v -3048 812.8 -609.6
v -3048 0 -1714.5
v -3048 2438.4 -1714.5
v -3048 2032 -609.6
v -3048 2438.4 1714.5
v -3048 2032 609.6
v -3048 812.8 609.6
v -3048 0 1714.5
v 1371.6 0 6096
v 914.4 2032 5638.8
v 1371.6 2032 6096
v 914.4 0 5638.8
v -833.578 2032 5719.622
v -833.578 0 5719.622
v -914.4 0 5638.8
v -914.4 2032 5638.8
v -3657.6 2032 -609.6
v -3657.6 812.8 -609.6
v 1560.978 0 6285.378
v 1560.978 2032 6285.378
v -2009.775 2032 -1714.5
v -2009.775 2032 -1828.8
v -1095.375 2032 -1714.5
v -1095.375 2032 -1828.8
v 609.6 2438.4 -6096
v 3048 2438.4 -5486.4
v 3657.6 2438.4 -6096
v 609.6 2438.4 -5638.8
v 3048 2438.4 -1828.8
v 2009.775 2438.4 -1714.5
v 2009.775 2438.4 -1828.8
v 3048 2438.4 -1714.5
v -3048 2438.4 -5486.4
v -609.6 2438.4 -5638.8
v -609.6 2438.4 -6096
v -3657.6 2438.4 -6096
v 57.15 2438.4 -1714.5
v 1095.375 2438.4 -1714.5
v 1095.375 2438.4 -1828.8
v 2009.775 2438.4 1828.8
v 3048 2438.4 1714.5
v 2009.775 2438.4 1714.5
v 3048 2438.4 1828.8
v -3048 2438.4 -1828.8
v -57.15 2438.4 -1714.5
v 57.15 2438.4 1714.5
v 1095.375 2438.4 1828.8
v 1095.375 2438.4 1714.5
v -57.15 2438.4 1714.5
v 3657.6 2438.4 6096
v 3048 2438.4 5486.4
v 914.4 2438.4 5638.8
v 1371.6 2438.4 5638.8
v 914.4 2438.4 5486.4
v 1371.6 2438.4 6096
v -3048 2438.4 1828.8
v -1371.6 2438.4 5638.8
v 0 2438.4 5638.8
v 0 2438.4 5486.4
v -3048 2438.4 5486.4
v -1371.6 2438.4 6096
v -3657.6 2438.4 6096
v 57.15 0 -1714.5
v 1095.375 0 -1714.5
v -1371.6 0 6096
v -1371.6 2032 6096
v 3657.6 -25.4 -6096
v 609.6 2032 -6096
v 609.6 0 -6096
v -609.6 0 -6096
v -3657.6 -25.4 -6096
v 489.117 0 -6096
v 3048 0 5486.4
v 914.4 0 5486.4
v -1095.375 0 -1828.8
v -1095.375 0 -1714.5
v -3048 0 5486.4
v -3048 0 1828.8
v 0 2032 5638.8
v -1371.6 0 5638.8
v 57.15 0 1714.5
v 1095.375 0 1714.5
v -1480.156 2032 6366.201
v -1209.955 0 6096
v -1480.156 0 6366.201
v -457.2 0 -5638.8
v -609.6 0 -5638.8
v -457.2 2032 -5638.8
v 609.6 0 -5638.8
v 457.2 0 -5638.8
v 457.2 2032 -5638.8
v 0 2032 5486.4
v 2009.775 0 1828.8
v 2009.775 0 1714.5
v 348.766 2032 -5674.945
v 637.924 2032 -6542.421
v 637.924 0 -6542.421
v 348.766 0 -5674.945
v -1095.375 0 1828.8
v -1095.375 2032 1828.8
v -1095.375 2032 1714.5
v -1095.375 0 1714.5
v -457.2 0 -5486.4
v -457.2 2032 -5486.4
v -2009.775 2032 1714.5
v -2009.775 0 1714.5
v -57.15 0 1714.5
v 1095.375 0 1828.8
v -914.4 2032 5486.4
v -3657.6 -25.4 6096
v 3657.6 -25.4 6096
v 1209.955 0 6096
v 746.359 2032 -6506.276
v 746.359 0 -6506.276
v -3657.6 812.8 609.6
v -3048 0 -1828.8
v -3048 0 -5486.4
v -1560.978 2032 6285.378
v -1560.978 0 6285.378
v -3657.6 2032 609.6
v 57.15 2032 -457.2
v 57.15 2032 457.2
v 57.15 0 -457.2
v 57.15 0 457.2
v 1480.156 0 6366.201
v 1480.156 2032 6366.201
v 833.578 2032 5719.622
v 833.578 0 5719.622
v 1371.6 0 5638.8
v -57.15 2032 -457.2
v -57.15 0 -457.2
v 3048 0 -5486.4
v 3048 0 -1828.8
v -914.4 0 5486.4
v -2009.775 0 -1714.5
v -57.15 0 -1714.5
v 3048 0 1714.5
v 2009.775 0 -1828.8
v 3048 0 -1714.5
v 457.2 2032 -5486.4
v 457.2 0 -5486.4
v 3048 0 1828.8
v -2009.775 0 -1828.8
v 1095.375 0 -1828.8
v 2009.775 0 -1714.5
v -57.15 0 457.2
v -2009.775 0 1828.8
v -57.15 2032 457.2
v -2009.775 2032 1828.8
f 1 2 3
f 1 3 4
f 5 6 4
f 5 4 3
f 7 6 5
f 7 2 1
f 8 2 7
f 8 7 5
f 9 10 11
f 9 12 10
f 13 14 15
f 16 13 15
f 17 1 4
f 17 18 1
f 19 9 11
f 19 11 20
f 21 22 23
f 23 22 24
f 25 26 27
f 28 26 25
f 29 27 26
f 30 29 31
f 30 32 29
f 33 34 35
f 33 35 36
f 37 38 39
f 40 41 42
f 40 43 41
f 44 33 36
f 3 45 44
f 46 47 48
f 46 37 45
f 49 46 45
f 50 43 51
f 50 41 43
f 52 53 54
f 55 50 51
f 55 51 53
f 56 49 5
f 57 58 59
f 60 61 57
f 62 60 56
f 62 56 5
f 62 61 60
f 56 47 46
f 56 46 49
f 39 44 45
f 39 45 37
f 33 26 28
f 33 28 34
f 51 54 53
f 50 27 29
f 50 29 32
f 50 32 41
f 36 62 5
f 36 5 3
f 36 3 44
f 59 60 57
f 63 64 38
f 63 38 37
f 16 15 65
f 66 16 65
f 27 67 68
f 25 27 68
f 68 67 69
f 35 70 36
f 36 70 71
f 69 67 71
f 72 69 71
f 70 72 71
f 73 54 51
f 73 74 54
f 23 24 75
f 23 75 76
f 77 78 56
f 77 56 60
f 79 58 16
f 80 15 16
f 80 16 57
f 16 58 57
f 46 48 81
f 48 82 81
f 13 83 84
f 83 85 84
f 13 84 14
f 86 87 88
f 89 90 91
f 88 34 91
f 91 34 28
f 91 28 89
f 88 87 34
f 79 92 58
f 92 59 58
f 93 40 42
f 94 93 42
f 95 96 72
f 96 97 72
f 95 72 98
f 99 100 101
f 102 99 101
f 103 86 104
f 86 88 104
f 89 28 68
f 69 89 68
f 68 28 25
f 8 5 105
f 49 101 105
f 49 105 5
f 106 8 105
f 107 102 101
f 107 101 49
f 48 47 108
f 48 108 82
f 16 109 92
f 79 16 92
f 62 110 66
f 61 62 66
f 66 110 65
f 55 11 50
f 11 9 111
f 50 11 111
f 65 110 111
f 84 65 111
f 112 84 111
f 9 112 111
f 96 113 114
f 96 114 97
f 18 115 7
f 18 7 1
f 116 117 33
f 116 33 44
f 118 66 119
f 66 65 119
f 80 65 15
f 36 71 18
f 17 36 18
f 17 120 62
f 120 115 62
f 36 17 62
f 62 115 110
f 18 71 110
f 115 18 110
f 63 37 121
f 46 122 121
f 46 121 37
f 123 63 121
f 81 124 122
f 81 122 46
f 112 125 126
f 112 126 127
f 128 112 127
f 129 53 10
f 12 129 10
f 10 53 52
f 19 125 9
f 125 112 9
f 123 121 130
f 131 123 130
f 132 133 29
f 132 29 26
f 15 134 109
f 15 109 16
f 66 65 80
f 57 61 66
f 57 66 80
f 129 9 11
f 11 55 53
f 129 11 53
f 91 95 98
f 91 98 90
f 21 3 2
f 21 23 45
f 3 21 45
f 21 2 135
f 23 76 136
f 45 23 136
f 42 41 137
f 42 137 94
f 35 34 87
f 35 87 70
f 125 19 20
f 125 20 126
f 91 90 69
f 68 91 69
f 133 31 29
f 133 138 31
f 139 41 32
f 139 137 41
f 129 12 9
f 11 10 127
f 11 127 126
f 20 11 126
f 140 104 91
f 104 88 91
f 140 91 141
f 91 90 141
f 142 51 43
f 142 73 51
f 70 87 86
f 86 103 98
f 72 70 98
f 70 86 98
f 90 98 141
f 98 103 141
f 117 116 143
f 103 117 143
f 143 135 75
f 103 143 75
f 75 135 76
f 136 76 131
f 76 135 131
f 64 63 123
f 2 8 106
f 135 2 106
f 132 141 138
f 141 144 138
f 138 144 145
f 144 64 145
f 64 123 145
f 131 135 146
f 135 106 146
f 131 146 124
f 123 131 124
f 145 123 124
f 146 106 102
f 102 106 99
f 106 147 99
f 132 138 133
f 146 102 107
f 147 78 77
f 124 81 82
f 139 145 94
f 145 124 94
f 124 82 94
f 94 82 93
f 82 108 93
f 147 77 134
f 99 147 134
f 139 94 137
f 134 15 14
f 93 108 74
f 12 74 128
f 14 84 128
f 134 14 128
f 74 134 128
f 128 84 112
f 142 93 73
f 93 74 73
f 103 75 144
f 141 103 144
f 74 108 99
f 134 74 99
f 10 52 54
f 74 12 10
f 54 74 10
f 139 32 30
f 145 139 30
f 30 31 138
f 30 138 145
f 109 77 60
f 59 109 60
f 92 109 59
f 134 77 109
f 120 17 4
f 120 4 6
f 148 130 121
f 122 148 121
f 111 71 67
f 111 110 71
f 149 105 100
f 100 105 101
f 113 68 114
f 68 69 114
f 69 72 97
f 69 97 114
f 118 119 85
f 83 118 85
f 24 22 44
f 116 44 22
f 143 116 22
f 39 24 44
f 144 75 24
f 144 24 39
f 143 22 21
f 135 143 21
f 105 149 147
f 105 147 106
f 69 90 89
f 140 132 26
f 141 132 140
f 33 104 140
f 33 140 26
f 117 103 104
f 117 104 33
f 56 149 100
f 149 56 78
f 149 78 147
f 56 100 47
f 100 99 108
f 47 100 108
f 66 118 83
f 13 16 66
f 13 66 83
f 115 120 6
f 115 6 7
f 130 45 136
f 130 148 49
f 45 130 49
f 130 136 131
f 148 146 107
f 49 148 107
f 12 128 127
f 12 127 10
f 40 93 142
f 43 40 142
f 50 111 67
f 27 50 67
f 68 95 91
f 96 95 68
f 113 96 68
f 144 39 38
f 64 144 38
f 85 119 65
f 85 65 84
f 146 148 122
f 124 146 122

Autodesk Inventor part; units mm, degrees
ref_plane "YZ Plane" through (0, 0, 0) normal (1, 0, 0) x (0, 1, 0)
ref_plane "XZ Plane" through (0, 0, 0) normal (0, 1, 0) x (-1, 0, 0)
ref_plane "XY Plane" through (0, 0, 0) normal (0, 0, 1) x (1, 0, 0)
sketch "Sketch1" plane through (0, 0, 0) normal (0, 1, 0) x (-1, 0, 0)
  line L0 (3657.6, -6096) -> (3657.6, 6096)
  line L1 (-3657.6, 6096) -> (-3657.6, -6096)
  line L2 (-5120.64, 0) -> (5120.64, 0) projected
  line L3 (0, -23842.3169) -> (0, 22994.4703) projected
  line L4 (-3048, 1714.5) -> (-3048, -1714.5)
  line L5 (3048, -5486.4) -> (3048, -1828.8)
  line L6 (3048, -1714.5) -> (3048, 1714.5)
  line L7 (3048, 1828.8) -> (3048, 5486.4)
  line L8 (-3048, -1828.8) -> (-3048, -5486.4)
  line L9 (-3048, 5486.4) -> (-3048, 1828.8)
  line L10 (-3048, 1714.5) -> (-3048, -1714.5)
  line L11 (-2009.775, -1828.8) -> (-2009.775, -1714.5)
  line L12 (-1095.375, -1828.8) -> (-1095.375, -1714.5)
  line L13 (-3048, -1714.5) -> (-2009.775, -1714.5)
  line L14 (-1095.375, -1714.5) -> (-57.15, -1714.5)
  line L15 (-3048, -1828.8) -> (-2009.775, -1828.8)
  line L16 (2009.775, -1828.8) -> (2009.775, -1714.5)
  line L17 (1095.375, -1828.8) -> (1095.375, -1714.5)
  line L18 (3048, -1714.5) -> (2009.775, -1714.5)
  line L19 (1095.375, -1714.5) -> (57.15, -1714.5)
  line L20 (3048, -1828.8) -> (2009.775, -1828.8)
  line L21 (1095.375, -1828.8) -> (-1095.375, -1828.8)
  line L22 (-2009.775, -1828.8) -> (-3048, -1828.8)
  line L23 (-1095.375, -1828.8) -> (1095.375, -1828.8)
  line L24 (2009.775, -1828.8) -> (3048, -1828.8)
  line L25 (57.15, -1714.5) -> (1095.375, -1714.5)
  line L26 (2009.775, -1714.5) -> (3048, -1714.5)
  line L27 (-2009.775, 1828.8) -> (-2009.775, 1714.5)
  line L28 (-1095.375, 1828.8) -> (-1095.375, 1714.5)
  line L29 (-3048, 1714.5) -> (-2009.775, 1714.5)
  line L30 (-1095.375, 1714.5) -> (-57.15, 1714.5)
  line L31 (-3048, 1828.8) -> (-2009.775, 1828.8)
  line L32 (3048, 1714.5) -> (2009.775, 1714.5)
  line L33 (3048, 1828.8) -> (2009.775, 1828.8)
  line L34 (2009.775, 1828.8) -> (2009.775, 1714.5)
  line L35 (1095.375, 1828.8) -> (1095.375, 1714.5)
  line L36 (1095.375, 1714.5) -> (57.15, 1714.5)
  line L37 (1095.375, 1828.8) -> (-1095.375, 1828.8)
  line L38 (-2009.775, 1828.8) -> (-3048, 1828.8)
  line L39 (-1095.375, 1828.8) -> (1095.375, 1828.8)
  line L40 (2009.775, 1828.8) -> (3048, 1828.8)
  line L41 (57.15, 1714.5) -> (1095.375, 1714.5)
  line L42 (2009.775, 1714.5) -> (3048, 1714.5)
  line L43 (-57.15, -457.2) -> (57.15, -457.2)
  line L44 (57.15, 457.2) -> (-57.15, 457.2)
  line L45 (-457.2, -6096) -> (-457.2, -5486.4)
  line L46 (457.2, -6096) -> (457.2, -5486.4)
  line L47 (-3048, -5486.4) -> (-457.2, -5486.4)
  line L48 (457.2, -5486.4) -> (3048, -5486.4)
  line L49 (-3657.6, -6096) -> (-457.2, -6096)
  line L50 (457.2, -6096) -> (3657.6, -6096)
  line L51 (914.4, 5486.4) -> (914.4, 6096)
  line L52 (-914.4, 6096) -> (-914.4, 5486.4)
  line L53 (3048, 5486.4) -> (914.4, 5486.4)
  line L54 (-914.4, 5486.4) -> (-3048, 5486.4)
  line L55 (3657.6, 6096) -> (914.4, 6096)
  line L56 (-914.4, 6096) -> (-3657.6, 6096)
  line L57 (-57.15, -1714.5) -> (-57.15, -457.2)
  line L58 (-57.15, 457.2) -> (-57.15, 1714.5)
  line L59 (-57.15, 1714.5) -> (-57.15, 457.2)
  line L60 (-57.15, -457.2) -> (-57.15, -1714.5)
  line L61 (57.15, -1714.5) -> (57.15, -457.2)
  line L62 (57.15, 457.2) -> (57.15, 1714.5)
  line L63 (57.15, 1714.5) -> (57.15, 457.2)
  line L64 (57.15, -457.2) -> (57.15, -1714.5)
  line L65 (-3048, 5486.4) -> (-3048, 1828.8)
  line L66 (-3048, 1828.8) -> (-2009.775, 1828.8)
  line L67 (-2009.775, 1828.8) -> (-2009.775, 1714.5)
  line L68 (-2009.775, 1714.5) -> (-3048, 1714.5)
  line L69 (-3048, 1714.5) -> (-3048, -1714.5)
  line L70 (-3048, -1714.5) -> (-2009.775, -1714.5)
  line L71 (-2009.775, -1714.5) -> (-2009.775, -1828.8)
  line L72 (-2009.775, -1828.8) -> (-3048, -1828.8)
  line L73 (-3048, -1828.8) -> (-3048, -5486.4)
  line L74 (-3048, -5486.4) -> (-457.2, -5486.4)
  line L75 (457.2, -5486.4) -> (3048, -5486.4)
  line L76 (3048, -5486.4) -> (3048, -1828.8)
  line L77 (3048, -1828.8) -> (2009.775, -1828.8)
  line L78 (2009.775, -1828.8) -> (2009.775, -1714.5)
  line L79 (2009.775, -1714.5) -> (3048, -1714.5)
  line L80 (3048, 1714.5) -> (3048, -1714.5)
  line L81 (3048, 1714.5) -> (2009.775, 1714.5)
  line L82 (2009.775, 1714.5) -> (2009.775, 1828.8)
  line L83 (2009.775, 1828.8) -> (3048, 1828.8)
  line L84 (3048, 1828.8) -> (3048, 5486.4)
  point P0 (0, 0)
  point P1 (0, 23842.3169)
  point P2 (0, -22994.4703)
  dimension "d2" = 7315.2
  dimension "d10" = 609.6
  dimension "d13" = 1038.225
  dimension "d14" = 914.4
  dimension "d17" = 114.3
  dimension "d18" = 1038.225
  dimension "d19" = 1038.225
  dimension "d20" = 914.4
  dimension "d21" = 914.4
  dimension "d23" = 609.6
  dimension "d24" = 4267.2
  dimension "d25" = 1828.8
  dimension "d26" = 12192
  dimension "d27" = 609.6
  dimension "d28" = 114.3
extrude "Extrusion1" add sketch "Sketch1" along normal blind 2438.4
sketch "Sketch2" plane through (-3657.6, 0, -6096) normal (-1, 0, 0) x (0, 0, 1)
  line L0 (0, 0) -> (12192, 0) projected
  line L1 (5486.4, 2032) -> (6705.6, 2032)
  line L2 (6705.6, 2032) -> (6705.6, 812.8)
  line L3 (6705.6, 812.8) -> (5486.4, 812.8)
  line L4 (5486.4, 812.8) -> (5486.4, 2032)
  line L5 (6096, 2926.08) -> (6096, -487.68) projected
  point P0 (6096, 0)
  dimension "d31" = 1219.2
  dimension "d33" = 1219.2
  dimension "d34" = 812.8
extrude "Extrusion2" cut sketch "Sketch2" against normal up to surface (609.6 mm away)
sketch "Sketch3" plane through (0, 2438.4, 0) normal (0, 1, 0) x (1, 0, 0)
  line L0 (57.15, 1714.5) -> (1095.375, 1714.5) projected
  line L1 (1095.375, 1714.5) -> (1095.375, 1828.8) projected
  line L2 (1095.375, 1828.8) -> (-1095.375, 1828.8) projected
  line L3 (-1095.375, 1828.8) -> (-1095.375, 1714.5) projected
  line L4 (-1095.375, 1714.5) -> (-57.15, 1714.5) projected
  line L5 (-57.15, 1714.5) -> (-57.15, 457.2) projected
  line L6 (-57.15, 457.2) -> (57.15, 457.2) projected
  line L7 (57.15, 457.2) -> (57.15, 1714.5) projected
  line L8 (-57.15, -1714.5) -> (-1095.375, -1714.5) projected
  line L9 (-1095.375, -1714.5) -> (-1095.375, -1828.8) projected
  line L10 (-1095.375, -1828.8) -> (1095.375, -1828.8) projected
  line L11 (1095.375, -1828.8) -> (1095.375, -1714.5) projected
  line L12 (1095.375, -1714.5) -> (57.15, -1714.5) projected
  line L13 (57.15, -1714.5) -> (57.15, -457.2) projected
  line L14 (57.15, -457.2) -> (-57.15, -457.2) projected
  line L15 (-57.15, -457.2) -> (-57.15, -1714.5) projected
  line L16 (3657.6, 6096) -> (457.2, 6096) projected
  line L17 (457.2, 6096) -> (457.2, 5486.4) projected
  line L18 (457.2, 5486.4) -> (3048, 5486.4) projected
  line L19 (3048, 5486.4) -> (3048, 1828.8) projected
  line L20 (3048, 1828.8) -> (2009.775, 1828.8) projected
  line L21 (2009.775, 1828.8) -> (2009.775, 1714.5) projected
  line L22 (2009.775, 1714.5) -> (3048, 1714.5) projected
  line L23 (3048, 1714.5) -> (3048, -1714.5) projected
  line L24 (3048, -1714.5) -> (2009.775, -1714.5) projected
  line L25 (2009.775, -1714.5) -> (2009.775, -1828.8) projected
  line L26 (2009.775, -1828.8) -> (3048, -1828.8) projected
  line L27 (3048, -1828.8) -> (3048, -5486.4) projected
  line L28 (3048, -5486.4) -> (914.4, -5486.4) projected
  line L29 (914.4, -5486.4) -> (914.4, -6096) projected
  line L30 (914.4, -6096) -> (3657.6, -6096) projected
  line L31 (3657.6, -6096) -> (3657.6, 6096) projected
  line L32 (-457.2, 6096) -> (457.2, 6096)
  line L33 (457.2, 6096) -> (457.2, 5486.4)
  line L34 (457.2, 5486.4) -> (-457.2, 5486.4)
  line L35 (-457.2, 5486.4) -> (-457.2, 6096)
  line L36 (-2009.775, 1828.8) -> (-1095.375, 1828.8)
  line L37 (-1095.375, 1828.8) -> (-1095.375, 1714.5)
  line L38 (-1095.375, 1714.5) -> (-2009.775, 1714.5)
  line L39 (-2009.775, 1714.5) -> (-2009.775, 1828.8)
  line L40 (1095.375, 1828.8) -> (2009.775, 1828.8)
  line L41 (2009.775, 1828.8) -> (2009.775, 1714.5)
  line L42 (2009.775, 1714.5) -> (1095.375, 1714.5)
  line L43 (1095.375, 1714.5) -> (1095.375, 1828.8)
  line L44 (-57.15, 457.2) -> (57.15, 457.2)
  line L45 (57.15, 457.2) -> (57.15, -457.2)
  line L46 (57.15, -457.2) -> (-57.15, -457.2)
  line L47 (-57.15, -457.2) -> (-57.15, 457.2)
  line L48 (1095.375, -1714.5) -> (2009.775, -1714.5)
  line L49 (2009.775, -1714.5) -> (2009.775, -1828.8)
  line L50 (2009.775, -1828.8) -> (1095.375, -1828.8)
  line L51 (1095.375, -1828.8) -> (1095.375, -1714.5)
  line L52 (-2009.775, -1714.5) -> (-1095.375, -1714.5)
  line L53 (-1095.375, -1714.5) -> (-1095.375, -1828.8)
  line L54 (-1095.375, -1828.8) -> (-2009.775, -1828.8)
  line L55 (-2009.775, -1828.8) -> (-2009.775, -1714.5)
  line L56 (-914.4, -5486.4) -> (914.4, -5486.4)
  line L57 (914.4, -5486.4) -> (914.4, -6096)
  line L58 (914.4, -6096) -> (-914.4, -6096)
  line L59 (-914.4, -6096) -> (-914.4, -5486.4)
  line L60 (1095.375, 1828.8) -> (2009.775, 1828.8)
  line L61 (2009.775, 1828.8) -> (2009.775, 1714.5)
  line L62 (2009.775, 1714.5) -> (1095.375, 1714.5)
  line L63 (1095.375, 1714.5) -> (1095.375, 1828.8)
  point P0 (0, 0)
extrude "Extrusion3" add sketch "Sketch3" against normal blind 406.4 contours L1 L40 L21 L42 | L45 L14 L47 L6 | L3 L38 L39 L36 | L48 L25 L50 L11 | L9 L54 L55 L52 | L34 L35 L32 L17 | L29 L58 L59 L56
sketch "Sketch5" plane through (0, 0, 0) normal (0, -1, 0) x (1, 0, 0)
  line L0 (3657.6, -6096) -> (457.2, -6096) projected
  line L1 (3657.6, 6096) -> (3657.6, -6096) projected
  line L2 (914.4, 6096) -> (3657.6, 6096) projected
  line L3 (914.4, 5486.4) -> (914.4, 6096) projected
  line L4 (3048, 5486.4) -> (914.4, 5486.4) projected
  line L5 (3048, 1828.8) -> (3048, 5486.4) projected
  line L6 (2009.775, 1828.8) -> (3048, 1828.8) projected
  line L7 (2009.775, 1714.5) -> (2009.775, 1828.8) projected
  line L8 (3048, 1714.5) -> (2009.775, 1714.5) projected
  line L9 (3048, -1714.5) -> (3048, 1714.5) projected
  line L10 (2009.775, -1714.5) -> (3048, -1714.5) projected
  line L11 (2009.775, -1828.8) -> (2009.775, -1714.5) projected
  line L12 (3048, -1828.8) -> (2009.775, -1828.8) projected
  line L13 (3048, -5486.4) -> (3048, -1828.8) projected
  line L14 (457.2, -5486.4) -> (3048, -5486.4) projected
  line L15 (457.2, -6096) -> (457.2, -5486.4) projected
  line L16 (-3657.6, 6096) -> (3657.6, 6096)
  line L17 (3657.6, 6096) -> (3657.6, -6096)
  line L18 (3657.6, -6096) -> (-3657.6, -6096)
  line L19 (-3657.6, -6096) -> (-3657.6, 6096)
  point P0 (0, 0)
extrude "Extrusion5" add sketch "Sketch5" along normal blind 25.4
sketch "Sketch6" plane through (0, 2438.4, 0) normal (0, 1, 0) x (1, 0, 0)
  line L0 (-3048, 5486.4) -> (3048, 5486.4) projected
  line L1 (3048, -5486.4) -> (-3048, -5486.4) projected
  line L2 (457.2, 5486.4) -> (457.2, 6096) projected
  line L3 (-457.2, 6096) -> (-457.2, 5486.4) projected
  line L4 (-914.4, -6096) -> (-914.4, -5486.4) projected
  line L5 (914.4, -6096) -> (-914.4, -6096) projected
  line L6 (914.4, -5486.4) -> (914.4, -6096) projected
  line L7 (3048, -5486.4) -> (914.4, -5486.4) projected
  line L8 (3048, -1828.8) -> (3048, -5486.4) projected
  line L9 (2009.775, -1828.8) -> (3048, -1828.8) projected
  line L10 (2009.775, -1714.5) -> (2009.775, -1828.8) projected
  line L11 (3048, -1714.5) -> (2009.775, -1714.5) projected
  line L12 (3048, 1714.5) -> (3048, -1714.5) projected
  line L13 (2009.775, 1714.5) -> (3048, 1714.5) projected
  line L14 (2009.775, 1828.8) -> (2009.775, 1714.5) projected
  line L15 (3048, 1828.8) -> (2009.775, 1828.8) projected
  line L16 (3048, 5486.4) -> (3048, 1828.8) projected
  line L17 (457.2, 5486.4) -> (3048, 5486.4) projected
  line L18 (457.2, 6096) -> (457.2, 5486.4) projected
  line L19 (-457.2, 6096) -> (457.2, 6096) projected
  line L20 (-457.2, 5486.4) -> (-457.2, 6096) projected
  line L21 (-3048, 5486.4) -> (-457.2, 5486.4) projected
  line L22 (-3048, 1828.8) -> (-3048, 5486.4) projected
  line L23 (-2009.775, 1828.8) -> (-3048, 1828.8) projected
  line L24 (-2009.775, 1714.5) -> (-2009.775, 1828.8) projected
  line L25 (-3048, 1714.5) -> (-2009.775, 1714.5) projected
  line L26 (-3048, -1714.5) -> (-3048, 1714.5) projected
  line L27 (-2009.775, -1714.5) -> (-3048, -1714.5) projected
  line L28 (-2009.775, -1828.8) -> (-2009.775, -1714.5) projected
  line L29 (-3048, -1828.8) -> (-2009.775, -1828.8) projected
  line L30 (-3048, -5486.4) -> (-3048, -1828.8) projected
  line L31 (-914.4, -5486.4) -> (-3048, -5486.4) projected
  line L32 (1095.375, -1714.5) -> (57.15, -1714.5) projected
  line L33 (1095.375, -1828.8) -> (1095.375, -1714.5) projected
  line L34 (-1095.375, -1828.8) -> (1095.375, -1828.8) projected
  line L35 (-1095.375, -1714.5) -> (-1095.375, -1828.8) projected
  line L36 (-57.15, -1714.5) -> (-1095.375, -1714.5) projected
  line L37 (-57.15, -457.2) -> (-57.15, -1714.5) projected
  line L38 (57.15, -457.2) -> (-57.15, -457.2) projected
  line L39 (57.15, -1714.5) -> (57.15, -457.2) projected
  line L40 (-57.15, 457.2) -> (57.15, 457.2) projected
  line L41 (-57.15, 1714.5) -> (-57.15, 457.2) projected
  line L42 (-1095.375, 1714.5) -> (-57.15, 1714.5) projected
  line L43 (-1095.375, 1828.8) -> (-1095.375, 1714.5) projected
  line L44 (1095.375, 1828.8) -> (-1095.375, 1828.8) projected
  line L45 (1095.375, 1714.5) -> (1095.375, 1828.8) projected
  line L46 (57.15, 1714.5) -> (1095.375, 1714.5) projected
  line L47 (57.15, 457.2) -> (57.15, 1714.5) projected
  line L48 (-457.2, 6096) -> (457.2, 6096)
  line L49 (457.2, 6096) -> (457.2, 5638.8)
  line L50 (457.2, 5638.8) -> (-457.2, 5638.8)
  line L51 (-457.2, 5638.8) -> (-457.2, 6096)
  line L52 (-914.4, -6096) -> (914.4, -6096)
  line L53 (914.4, -6096) -> (914.4, -5638.8)
  line L54 (914.4, -5638.8) -> (-914.4, -5638.8)
  line L55 (-914.4, -5638.8) -> (-914.4, -6096)
  point P0 (0, 0)
  dimension "d46" = 152.4
  dimension "d47" = 152.4
extrude "Extrusion6" cut sketch "Sketch6" against normal up to next contours L3 L19 L2 L50 | L54 L6 L5 L4
sketch "Sketch7" plane through (0, 2438.4, 0) normal (0, 1, 0) x (1, 0, 0)
  line L0 (-914.4, -5638.8) -> (914.4, -5638.8) projected
  line L1 (3048, -5486.4) -> (-3048, -5486.4) projected
  line L2 (0, -5638.8) -> (914.4, -5638.8)
  line L3 (914.4, -5638.8) -> (914.4, -5486.4)
  line L4 (914.4, -5486.4) -> (0, -5486.4)
  line L5 (0, -5486.4) -> (0, -5638.8)
  point P0 (0, 0)
extrude "Extrusion7" cut sketch "Sketch7" against normal up to next
sketch "Sketch8" plane through (0, 2438.4, 0) normal (0, 1, 0) x (1, 0, 0)
  line L0 (3657.6, 6096) -> (457.2, 6096) projected
  line L1 (-457.2, 5638.8) -> (-457.2, 6096) projected
  line L2 (-457.2, 6096) -> (-3657.6, 6096) projected
  line L3 (-914.4, -6096) -> (-914.4, -5638.8) projected
  line L4 (-914.4, -5638.8) -> (0, -5638.8) projected
  line L5 (-914.4, -6096) -> (-1371.6, -6096)
  line L6 (-1371.6, -6096) -> (-1371.6, -5638.8)
  line L7 (-1371.6, -5638.8) -> (-914.4, -5638.8)
  line L8 (-914.4, -5638.8) -> (-914.4, -6096)
  line L9 (914.4, -6096) -> (1371.6, -6096)
  line L10 (1371.6, -6096) -> (1371.6, -5638.8)
  line L11 (1371.6, -5638.8) -> (914.4, -5638.8)
  line L12 (914.4, -5638.8) -> (914.4, -6096)
  line L13 (457.2, 5638.8) -> (609.6, 5638.8)
  line L14 (609.6, 5638.8) -> (609.6, 6096)
  line L15 (609.6, 6096) -> (457.2, 6096)
  line L16 (457.2, 6096) -> (457.2, 5638.8)
  line L17 (-457.2, 5638.8) -> (-609.6, 5638.8)
  line L18 (-609.6, 5638.8) -> (-609.6, 6096)
  line L19 (-609.6, 6096) -> (-457.2, 6096)
  line L20 (-457.2, 6096) -> (-457.2, 5638.8)
  point P0 (0, 0)
  dimension "d52" = 457.2
  dimension "d53" = 457.2
  dimension "d54" = 152.4
  dimension "d55" = 152.4
extrude "Extrusion8" cut sketch "Sketch8" against normal up to surface (2438.4 mm away)
sketch "Sketch9" plane through (0, 2438.4, 0) normal (0, 1, 0) x (1, 0, 0)
  line L0 (1095.375, -1714.5) -> (57.15, -1714.5) projected
  line L1 (1095.375, -1828.8) -> (1095.375, -1714.5) projected
  line L2 (-1095.375, -1828.8) -> (1095.375, -1828.8) projected
  line L3 (-1095.375, -1714.5) -> (-1095.375, -1828.8) projected
  line L4 (-57.15, -1714.5) -> (-1095.375, -1714.5) projected
  line L5 (-57.15, -457.2) -> (-57.15, -1714.5) projected
  line L6 (57.15, -457.2) -> (-57.15, -457.2) projected
  line L7 (57.15, -1714.5) -> (57.15, -457.2) projected
  line L8 (-57.15, 457.2) -> (57.15, 457.2) projected
  line L9 (-57.15, 1714.5) -> (-57.15, 457.2) projected
  line L10 (-1095.375, 1714.5) -> (-57.15, 1714.5) projected
  line L11 (-1095.375, 1828.8) -> (-1095.375, 1714.5) projected
  line L12 (1095.375, 1828.8) -> (-1095.375, 1828.8) projected
  line L13 (1095.375, 1714.5) -> (1095.375, 1828.8) projected
  line L14 (57.15, 1714.5) -> (1095.375, 1714.5) projected
  line L15 (57.15, 457.2) -> (57.15, 1714.5) projected
  line L16 (914.4, -5486.4) -> (914.4, -5638.8) projected
  line L17 (3048, -5486.4) -> (914.4, -5486.4) projected
  line L18 (3048, -1828.8) -> (3048, -5486.4) projected
  line L19 (2009.775, -1828.8) -> (3048, -1828.8) projected
  line L20 (2009.775, -1714.5) -> (2009.775, -1828.8) projected
  line L21 (3048, -1714.5) -> (2009.775, -1714.5) projected
  line L22 (3048, 1714.5) -> (3048, -1714.5) projected
  line L23 (2009.775, 1714.5) -> (3048, 1714.5) projected
  line L24 (2009.775, 1828.8) -> (2009.775, 1714.5) projected
  line L25 (3048, 1828.8) -> (2009.775, 1828.8) projected
  line L26 (3048, 5486.4) -> (3048, 1828.8) projected
  line L27 (457.2, 5486.4) -> (3048, 5486.4) projected
  line L28 (457.2, 5638.8) -> (457.2, 5486.4) projected
  line L29 (609.6, 5638.8) -> (457.2, 5638.8) projected
  line L30 (609.6, 6096) -> (609.6, 5638.8) projected
  line L31 (-609.6, 6096) -> (609.6, 6096) projected
  line L32 (-609.6, 5638.8) -> (-609.6, 6096) projected
  line L33 (-457.2, 5638.8) -> (-609.6, 5638.8) projected
  line L34 (-457.2, 5486.4) -> (-457.2, 5638.8) projected
  line L35 (-3048, 5486.4) -> (-457.2, 5486.4) projected
  line L36 (-3048, 1828.8) -> (-3048, 5486.4) projected
  line L37 (-2009.775, 1828.8) -> (-3048, 1828.8) projected
  line L38 (-2009.775, 1714.5) -> (-2009.775, 1828.8) projected
  line L39 (-3048, 1714.5) -> (-2009.775, 1714.5) projected
  line L40 (-3048, -1714.5) -> (-3048, 1714.5) projected
  line L41 (-2009.775, -1714.5) -> (-3048, -1714.5) projected
  line L42 (-2009.775, -1828.8) -> (-2009.775, -1714.5) projected
  line L43 (-3048, -1828.8) -> (-2009.775, -1828.8) projected
  line L44 (-3048, -5486.4) -> (-3048, -1828.8) projected
  line L45 (-914.4, -5486.4) -> (-3048, -5486.4) projected
  line L46 (-914.4, -5638.8) -> (-914.4, -5486.4) projected
  line L47 (-1371.6, -5638.8) -> (-914.4, -5638.8) projected
  line L48 (-1371.6, -6096) -> (-1371.6, -5638.8) projected
  line L49 (1371.6, -6096) -> (-1371.6, -6096) projected
  line L50 (1371.6, -5638.8) -> (1371.6, -6096) projected
  line L51 (914.4, -5638.8) -> (1371.6, -5638.8) projected
  line L52 (1095.375, 1828.8) -> (2009.775, 1828.8)
  line L53 (2009.775, 1828.8) -> (2009.775, 1714.5)
  line L54 (2009.775, 1714.5) -> (1095.375, 1714.5)
  line L55 (1095.375, 1714.5) -> (1095.375, 1828.8)
  line L56 (1095.375, -1714.5) -> (2009.775, -1714.5)
  line L57 (2009.775, -1714.5) -> (2009.775, -1828.8)
  line L58 (2009.775, -1828.8) -> (1095.375, -1828.8)
  line L59 (1095.375, -1828.8) -> (1095.375, -1714.5)
  point P0 (0, 0)
extrude "Extrusion9" cut sketch "Sketch9" against normal up to next contours L56 L20 L58 L1 | L54 L13 L52 L24
sketch "Open Doors" plane through (0, 0, 0) normal (0, 1, 0) x (1, 0, 0)
  line L0 (457.2, 5638.8) -> (746.3587, 6506.276)
  line L1 (746.3587, 6506.276) -> (637.9242, 6542.4208)
  line L2 (637.9242, 6542.4208) -> (348.7655, 5674.9448)
  line L3 (348.7655, 5674.9448) -> (457.2, 5638.8)
  line L4 (914.4, -5638.8) -> (1560.9784, -6285.3784)
  line L5 (1560.9784, -6285.3784) -> (1480.1561, -6366.2007)
  line L6 (1480.1561, -6366.2007) -> (833.5777, -5719.6223)
  line L7 (833.5777, -5719.6223) -> (914.4, -5638.8)
  line L8 (-914.4, -5638.8) -> (-1560.9784, -6285.3784)
  line L9 (-1560.9784, -6285.3784) -> (-1480.1561, -6366.2007)
  line L10 (-1480.1561, -6366.2007) -> (-833.5777, -5719.6223)
  line L11 (-833.5777, -5719.6223) -> (-914.4, -5638.8)
  point P0 (609.6, 6096)
  point P1 (-1371.6, -6096)
  point P2 (1371.6, -6096)
  point P3 (0, 0)
  dimension "d60" = 914.4
  dimension "d62" = 114.3
  dimension "d63" = 914.4
  dimension "d64" = 114.3
  dimension "d65" = 914.4
  dimension "d66" = 114.3
extrude "Extrusion10" add sketch "Open Doors" along normal blind 2032
properties part number "East_Structure_Hose_Test"
